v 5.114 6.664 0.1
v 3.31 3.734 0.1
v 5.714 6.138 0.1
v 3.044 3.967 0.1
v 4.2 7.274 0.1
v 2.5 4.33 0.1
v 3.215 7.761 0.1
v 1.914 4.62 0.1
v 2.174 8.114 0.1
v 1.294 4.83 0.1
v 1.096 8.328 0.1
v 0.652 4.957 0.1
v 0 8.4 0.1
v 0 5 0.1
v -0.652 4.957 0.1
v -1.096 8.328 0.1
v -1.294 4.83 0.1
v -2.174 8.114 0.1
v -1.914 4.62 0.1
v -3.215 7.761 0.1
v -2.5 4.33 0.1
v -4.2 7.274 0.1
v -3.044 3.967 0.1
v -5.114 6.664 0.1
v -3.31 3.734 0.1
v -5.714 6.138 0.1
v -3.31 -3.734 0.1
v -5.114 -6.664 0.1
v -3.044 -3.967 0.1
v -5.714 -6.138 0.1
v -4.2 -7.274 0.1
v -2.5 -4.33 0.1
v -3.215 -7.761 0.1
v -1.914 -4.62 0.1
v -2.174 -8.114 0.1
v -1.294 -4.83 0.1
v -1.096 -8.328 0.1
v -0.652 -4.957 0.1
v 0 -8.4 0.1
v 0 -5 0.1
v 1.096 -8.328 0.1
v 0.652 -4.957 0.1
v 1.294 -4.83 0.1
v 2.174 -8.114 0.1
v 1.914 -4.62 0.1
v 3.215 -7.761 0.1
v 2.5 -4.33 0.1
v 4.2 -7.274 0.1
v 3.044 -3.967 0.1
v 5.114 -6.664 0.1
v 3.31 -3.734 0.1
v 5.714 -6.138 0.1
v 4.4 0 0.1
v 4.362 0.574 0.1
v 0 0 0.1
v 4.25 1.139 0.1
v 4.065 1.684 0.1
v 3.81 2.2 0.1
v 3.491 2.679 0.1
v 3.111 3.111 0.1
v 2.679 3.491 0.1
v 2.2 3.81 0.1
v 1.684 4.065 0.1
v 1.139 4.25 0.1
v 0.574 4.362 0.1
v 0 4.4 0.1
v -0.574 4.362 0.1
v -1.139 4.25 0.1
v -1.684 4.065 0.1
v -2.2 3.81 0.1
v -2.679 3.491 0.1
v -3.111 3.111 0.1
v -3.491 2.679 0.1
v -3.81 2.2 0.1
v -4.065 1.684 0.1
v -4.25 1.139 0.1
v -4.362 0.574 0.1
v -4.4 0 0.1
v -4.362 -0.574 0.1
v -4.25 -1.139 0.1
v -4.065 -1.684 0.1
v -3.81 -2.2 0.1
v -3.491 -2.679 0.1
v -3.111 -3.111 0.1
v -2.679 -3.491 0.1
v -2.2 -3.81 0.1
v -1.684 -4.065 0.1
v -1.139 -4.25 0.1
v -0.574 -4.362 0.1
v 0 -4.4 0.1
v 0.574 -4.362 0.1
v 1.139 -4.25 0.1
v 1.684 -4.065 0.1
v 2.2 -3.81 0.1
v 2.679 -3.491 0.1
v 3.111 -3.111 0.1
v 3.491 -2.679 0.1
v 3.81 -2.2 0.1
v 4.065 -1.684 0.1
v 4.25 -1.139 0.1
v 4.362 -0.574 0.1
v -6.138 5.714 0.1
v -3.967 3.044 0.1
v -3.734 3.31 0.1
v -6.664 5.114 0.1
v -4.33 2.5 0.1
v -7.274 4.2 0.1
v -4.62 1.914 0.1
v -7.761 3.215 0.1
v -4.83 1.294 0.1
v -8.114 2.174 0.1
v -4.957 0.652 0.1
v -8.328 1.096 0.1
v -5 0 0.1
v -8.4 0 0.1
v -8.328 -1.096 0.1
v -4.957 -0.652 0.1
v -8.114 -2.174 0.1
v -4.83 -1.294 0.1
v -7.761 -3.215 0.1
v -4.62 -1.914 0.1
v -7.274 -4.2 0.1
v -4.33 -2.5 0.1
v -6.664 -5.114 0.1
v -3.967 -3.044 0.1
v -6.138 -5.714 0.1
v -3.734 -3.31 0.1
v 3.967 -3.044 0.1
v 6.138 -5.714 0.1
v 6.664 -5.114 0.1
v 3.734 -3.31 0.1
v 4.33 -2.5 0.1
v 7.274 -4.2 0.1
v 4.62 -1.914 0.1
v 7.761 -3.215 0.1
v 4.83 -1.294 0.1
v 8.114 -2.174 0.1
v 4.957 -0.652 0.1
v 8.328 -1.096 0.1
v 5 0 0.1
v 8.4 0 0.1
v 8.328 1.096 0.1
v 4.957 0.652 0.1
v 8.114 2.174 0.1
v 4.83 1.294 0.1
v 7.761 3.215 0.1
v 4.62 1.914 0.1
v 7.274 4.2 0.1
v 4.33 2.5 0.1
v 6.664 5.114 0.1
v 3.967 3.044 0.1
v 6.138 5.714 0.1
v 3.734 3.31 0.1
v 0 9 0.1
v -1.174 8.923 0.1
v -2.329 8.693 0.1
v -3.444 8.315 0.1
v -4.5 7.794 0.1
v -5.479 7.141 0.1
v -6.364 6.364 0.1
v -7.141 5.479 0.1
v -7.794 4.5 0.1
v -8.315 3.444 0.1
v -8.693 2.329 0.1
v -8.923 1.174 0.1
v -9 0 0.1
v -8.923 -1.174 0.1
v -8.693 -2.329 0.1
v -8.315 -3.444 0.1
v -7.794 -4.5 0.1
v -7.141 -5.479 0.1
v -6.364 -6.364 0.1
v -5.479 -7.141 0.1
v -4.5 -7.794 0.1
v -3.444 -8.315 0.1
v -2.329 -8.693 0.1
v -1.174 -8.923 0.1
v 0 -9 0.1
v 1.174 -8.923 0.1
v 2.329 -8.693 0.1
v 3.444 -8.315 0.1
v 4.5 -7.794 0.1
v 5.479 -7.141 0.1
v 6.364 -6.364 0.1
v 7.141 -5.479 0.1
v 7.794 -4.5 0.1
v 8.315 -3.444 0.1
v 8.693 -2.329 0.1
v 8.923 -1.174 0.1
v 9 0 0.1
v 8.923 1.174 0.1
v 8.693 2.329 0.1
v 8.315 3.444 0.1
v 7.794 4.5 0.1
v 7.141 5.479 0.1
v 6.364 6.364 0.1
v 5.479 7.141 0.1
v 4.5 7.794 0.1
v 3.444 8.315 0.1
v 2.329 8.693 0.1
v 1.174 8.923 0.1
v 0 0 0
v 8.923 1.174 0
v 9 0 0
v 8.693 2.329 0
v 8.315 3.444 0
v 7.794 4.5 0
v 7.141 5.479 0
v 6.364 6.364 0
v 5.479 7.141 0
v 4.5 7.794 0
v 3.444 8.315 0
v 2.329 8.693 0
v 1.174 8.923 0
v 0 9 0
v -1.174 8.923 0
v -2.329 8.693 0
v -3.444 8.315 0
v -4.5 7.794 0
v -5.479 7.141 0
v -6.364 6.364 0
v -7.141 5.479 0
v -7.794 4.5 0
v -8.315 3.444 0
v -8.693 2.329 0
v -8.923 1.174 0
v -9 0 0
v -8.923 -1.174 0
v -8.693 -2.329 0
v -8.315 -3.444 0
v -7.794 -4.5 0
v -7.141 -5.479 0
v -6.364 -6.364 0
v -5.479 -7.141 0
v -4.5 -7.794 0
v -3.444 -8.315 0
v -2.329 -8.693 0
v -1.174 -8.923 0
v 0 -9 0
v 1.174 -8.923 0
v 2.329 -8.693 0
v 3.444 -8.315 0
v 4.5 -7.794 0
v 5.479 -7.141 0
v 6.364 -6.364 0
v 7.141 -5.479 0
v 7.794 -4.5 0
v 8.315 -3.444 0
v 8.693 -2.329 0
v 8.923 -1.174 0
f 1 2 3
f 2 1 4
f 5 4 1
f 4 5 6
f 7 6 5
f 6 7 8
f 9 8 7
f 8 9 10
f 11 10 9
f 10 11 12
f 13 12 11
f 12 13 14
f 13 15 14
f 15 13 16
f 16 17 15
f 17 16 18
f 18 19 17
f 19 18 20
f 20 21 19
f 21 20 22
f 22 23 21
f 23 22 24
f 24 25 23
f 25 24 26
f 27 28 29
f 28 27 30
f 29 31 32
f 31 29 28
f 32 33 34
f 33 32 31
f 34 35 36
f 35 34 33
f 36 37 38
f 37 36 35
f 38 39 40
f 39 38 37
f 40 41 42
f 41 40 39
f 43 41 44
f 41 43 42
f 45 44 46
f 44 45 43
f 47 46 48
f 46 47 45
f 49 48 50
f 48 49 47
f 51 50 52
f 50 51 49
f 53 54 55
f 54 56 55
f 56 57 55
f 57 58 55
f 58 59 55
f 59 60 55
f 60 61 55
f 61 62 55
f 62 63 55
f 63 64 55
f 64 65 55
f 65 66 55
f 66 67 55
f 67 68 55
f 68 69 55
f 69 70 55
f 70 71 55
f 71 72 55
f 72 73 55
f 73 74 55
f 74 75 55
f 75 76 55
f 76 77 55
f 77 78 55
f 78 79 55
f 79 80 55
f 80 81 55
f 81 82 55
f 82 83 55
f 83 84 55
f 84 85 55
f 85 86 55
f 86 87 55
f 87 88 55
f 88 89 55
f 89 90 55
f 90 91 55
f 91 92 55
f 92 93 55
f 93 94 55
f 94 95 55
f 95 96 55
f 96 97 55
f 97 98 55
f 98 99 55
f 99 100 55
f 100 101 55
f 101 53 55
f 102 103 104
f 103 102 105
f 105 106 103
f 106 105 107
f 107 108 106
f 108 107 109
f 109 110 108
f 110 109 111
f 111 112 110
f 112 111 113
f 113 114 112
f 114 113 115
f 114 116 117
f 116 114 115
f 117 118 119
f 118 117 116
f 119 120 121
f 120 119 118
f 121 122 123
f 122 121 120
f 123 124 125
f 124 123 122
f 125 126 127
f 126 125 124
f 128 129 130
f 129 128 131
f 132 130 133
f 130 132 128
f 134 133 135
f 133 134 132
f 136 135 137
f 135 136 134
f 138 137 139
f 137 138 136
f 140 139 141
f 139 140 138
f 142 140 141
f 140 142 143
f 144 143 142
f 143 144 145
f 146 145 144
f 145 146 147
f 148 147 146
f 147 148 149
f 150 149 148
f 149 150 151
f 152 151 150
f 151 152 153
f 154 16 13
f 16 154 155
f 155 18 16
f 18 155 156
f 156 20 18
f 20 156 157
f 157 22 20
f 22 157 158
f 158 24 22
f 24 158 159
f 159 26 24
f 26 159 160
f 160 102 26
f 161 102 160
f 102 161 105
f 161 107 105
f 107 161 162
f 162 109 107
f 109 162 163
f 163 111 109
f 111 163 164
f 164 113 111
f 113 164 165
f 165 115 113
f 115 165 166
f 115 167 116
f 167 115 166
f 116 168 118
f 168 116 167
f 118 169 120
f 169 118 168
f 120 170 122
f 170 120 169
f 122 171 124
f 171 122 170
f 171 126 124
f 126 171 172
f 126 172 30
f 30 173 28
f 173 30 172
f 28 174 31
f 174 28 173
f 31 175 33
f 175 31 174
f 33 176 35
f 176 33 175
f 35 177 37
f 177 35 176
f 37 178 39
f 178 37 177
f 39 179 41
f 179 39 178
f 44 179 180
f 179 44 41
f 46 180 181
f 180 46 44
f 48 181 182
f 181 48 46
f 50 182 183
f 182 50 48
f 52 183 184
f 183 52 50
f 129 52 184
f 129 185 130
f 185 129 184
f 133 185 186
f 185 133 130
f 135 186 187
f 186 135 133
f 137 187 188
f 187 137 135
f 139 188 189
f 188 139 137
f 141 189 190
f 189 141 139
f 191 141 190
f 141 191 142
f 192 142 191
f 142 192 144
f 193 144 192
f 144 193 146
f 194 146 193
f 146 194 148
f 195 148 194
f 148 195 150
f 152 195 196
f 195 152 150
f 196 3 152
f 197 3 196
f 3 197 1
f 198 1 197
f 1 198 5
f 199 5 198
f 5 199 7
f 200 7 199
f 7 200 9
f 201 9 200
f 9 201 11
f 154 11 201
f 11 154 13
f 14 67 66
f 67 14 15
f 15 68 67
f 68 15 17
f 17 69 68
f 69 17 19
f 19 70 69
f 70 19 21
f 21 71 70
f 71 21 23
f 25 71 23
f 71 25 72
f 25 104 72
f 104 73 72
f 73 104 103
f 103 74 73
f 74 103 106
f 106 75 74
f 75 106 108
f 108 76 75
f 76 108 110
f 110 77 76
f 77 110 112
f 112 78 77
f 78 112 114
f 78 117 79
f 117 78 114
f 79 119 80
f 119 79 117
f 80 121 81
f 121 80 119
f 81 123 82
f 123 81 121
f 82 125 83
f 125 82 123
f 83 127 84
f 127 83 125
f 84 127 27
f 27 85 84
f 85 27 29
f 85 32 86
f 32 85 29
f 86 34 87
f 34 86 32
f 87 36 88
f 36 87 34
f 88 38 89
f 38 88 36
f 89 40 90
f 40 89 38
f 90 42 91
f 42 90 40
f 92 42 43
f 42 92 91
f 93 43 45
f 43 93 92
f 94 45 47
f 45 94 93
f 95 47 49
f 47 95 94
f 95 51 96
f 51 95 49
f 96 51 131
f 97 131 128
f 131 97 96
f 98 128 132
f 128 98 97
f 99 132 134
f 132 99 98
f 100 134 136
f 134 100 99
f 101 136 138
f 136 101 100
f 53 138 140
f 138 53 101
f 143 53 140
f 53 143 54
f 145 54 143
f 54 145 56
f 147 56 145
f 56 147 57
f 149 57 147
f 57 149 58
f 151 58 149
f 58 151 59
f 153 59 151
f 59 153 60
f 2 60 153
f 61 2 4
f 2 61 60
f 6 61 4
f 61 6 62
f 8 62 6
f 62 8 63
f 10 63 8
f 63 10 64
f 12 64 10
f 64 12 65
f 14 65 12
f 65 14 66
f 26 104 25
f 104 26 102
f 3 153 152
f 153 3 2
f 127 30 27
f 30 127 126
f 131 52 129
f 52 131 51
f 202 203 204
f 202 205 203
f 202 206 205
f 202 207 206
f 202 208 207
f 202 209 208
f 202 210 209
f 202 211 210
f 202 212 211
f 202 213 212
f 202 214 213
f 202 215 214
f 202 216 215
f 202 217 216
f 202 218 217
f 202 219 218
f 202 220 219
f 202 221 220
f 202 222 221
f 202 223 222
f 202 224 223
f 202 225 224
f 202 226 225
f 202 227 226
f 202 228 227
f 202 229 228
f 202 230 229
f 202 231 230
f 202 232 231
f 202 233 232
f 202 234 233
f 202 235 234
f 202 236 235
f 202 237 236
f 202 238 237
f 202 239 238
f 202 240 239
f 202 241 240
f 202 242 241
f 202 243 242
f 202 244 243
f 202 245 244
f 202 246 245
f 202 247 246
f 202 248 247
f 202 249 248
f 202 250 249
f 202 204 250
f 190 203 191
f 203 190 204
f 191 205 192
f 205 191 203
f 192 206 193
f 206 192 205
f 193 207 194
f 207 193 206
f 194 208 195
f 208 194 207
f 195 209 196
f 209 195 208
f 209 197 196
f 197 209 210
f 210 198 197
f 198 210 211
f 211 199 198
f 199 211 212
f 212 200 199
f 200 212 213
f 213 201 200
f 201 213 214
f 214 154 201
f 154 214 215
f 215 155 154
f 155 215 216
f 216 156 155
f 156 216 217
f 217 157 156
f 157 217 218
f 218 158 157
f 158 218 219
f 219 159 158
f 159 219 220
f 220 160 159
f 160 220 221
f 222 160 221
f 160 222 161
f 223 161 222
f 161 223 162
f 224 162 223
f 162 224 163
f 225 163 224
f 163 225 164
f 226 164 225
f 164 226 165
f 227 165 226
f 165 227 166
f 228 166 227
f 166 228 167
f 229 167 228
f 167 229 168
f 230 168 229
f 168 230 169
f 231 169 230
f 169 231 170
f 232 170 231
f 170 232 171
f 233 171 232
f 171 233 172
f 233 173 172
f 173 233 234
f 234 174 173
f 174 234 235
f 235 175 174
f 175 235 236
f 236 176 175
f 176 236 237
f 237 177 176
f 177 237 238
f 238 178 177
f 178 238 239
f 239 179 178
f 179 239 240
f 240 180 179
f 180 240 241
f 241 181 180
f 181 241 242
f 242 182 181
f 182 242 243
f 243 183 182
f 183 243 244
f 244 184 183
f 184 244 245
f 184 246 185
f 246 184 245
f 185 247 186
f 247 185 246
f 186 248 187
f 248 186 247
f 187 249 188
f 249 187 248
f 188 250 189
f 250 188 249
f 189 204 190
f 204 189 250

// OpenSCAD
// file: ../p/48/1-4cyli.scad
use <../../lib.scad>
function ldraw_lib__48__1_4cyli() = [
// 0 Hi-Res Cylinder 0.25
// 0 Name: 48\1-4cyli.dat
// 0 Author: Manfred Moolhuysen
// 0 !LDRAW_ORG 48_Primitive UPDATE 2009-01
// 0 !LICENSE Licensed under CC BY 2.0 and CC BY 4.0 : see CAreadme.txt
// 
// 0 BFC CERTIFY CCW
  [0,"BFC","CERTIFY"],
  [0,"BFC","CCW"],
// 
// 0 !HISTORY 1999-07-05 [PTadmin] Official Update 1999-05
// 0 !HISTORY 2002-02-28 [hafhead] Added BFC statement
// 0 !HISTORY 2002-04-25 [PTadmin] Official Update 2002-02
// 0 !HISTORY 2007-06-24 [PTadmin] Header formatted for Contributor Agreement
// 0 !HISTORY 2008-07-01 [PTadmin] Official Update 2008-01
// 0 !HISTORY 2008-07-07 [guyvivan] Made BFC'ed CCW (2005-12-06)
// 0 !HISTORY 2009-05-02 [PTadmin] Official Update 2009-01
// 
// 
// 4 16 0.9914 0 0.1305 1 0 0 1 1 0 0.9914 1 0.1305
  [4,16,0.9914,0,0.1305,1,0,0,1,1,0,0.9914,1,0.1305],
// 4 16 0.9659 0 0.2588 0.9914 0 0.1305 0.9914 1 0.1305 0.9659 1 0.2588
  [4,16,0.9659,0,0.2588,0.9914,0,0.1305,0.9914,1,0.1305,0.9659,1,0.2588],
// 4 16 0.9239 0 0.3827 0.9659 0 0.2588 0.9659 1 0.2588 0.9239 1 0.3827
  [4,16,0.9239,0,0.3827,0.9659,0,0.2588,0.9659,1,0.2588,0.9239,1,0.3827],
// 4 16 0.866 0 0.5 0.9239 0 0.3827 0.9239 1 0.3827 0.866 1 0.5
  [4,16,0.866,0,0.5,0.9239,0,0.3827,0.9239,1,0.3827,0.866,1,0.5],
// 4 16 0.7934 0 0.6088 0.866 0 0.5 0.866 1 0.5 0.7934 1 0.6088
  [4,16,0.7934,0,0.6088,0.866,0,0.5,0.866,1,0.5,0.7934,1,0.6088],
// 4 16 0.7071 0 0.7071 0.7934 0 0.6088 0.7934 1 0.6088 0.7071 1 0.7071
  [4,16,0.7071,0,0.7071,0.7934,0,0.6088,0.7934,1,0.6088,0.7071,1,0.7071],
// 4 16 0.6088 0 0.7934 0.7071 0 0.7071 0.7071 1 0.7071 0.6088 1 0.7934
  [4,16,0.6088,0,0.7934,0.7071,0,0.7071,0.7071,1,0.7071,0.6088,1,0.7934],
// 4 16 0.5 0 0.866 0.6088 0 0.7934 0.6088 1 0.7934 0.5 1 0.866
  [4,16,0.5,0,0.866,0.6088,0,0.7934,0.6088,1,0.7934,0.5,1,0.866],
// 4 16 0.3827 0 0.9239 0.5 0 0.866 0.5 1 0.866 0.3827 1 0.9239
  [4,16,0.3827,0,0.9239,0.5,0,0.866,0.5,1,0.866,0.3827,1,0.9239],
// 4 16 0.2588 0 0.9659 0.3827 0 0.9239 0.3827 1 0.9239 0.2588 1 0.9659
  [4,16,0.2588,0,0.9659,0.3827,0,0.9239,0.3827,1,0.9239,0.2588,1,0.9659],
// 4 16 0.1305 0 0.9914 0.2588 0 0.9659 0.2588 1 0.9659 0.1305 1 0.9914
  [4,16,0.1305,0,0.9914,0.2588,0,0.9659,0.2588,1,0.9659,0.1305,1,0.9914],
// 4 16 0 0 1 0.1305 0 0.9914 0.1305 1 0.9914 0 1 1
  [4,16,0,0,1,0.1305,0,0.9914,0.1305,1,0.9914,0,1,1],
// 
// 0 conditional lines
// 5 24 1 1 0 1 0 0 1 1 -1 0.9914 1 0.1305
  [5,24,1,1,0,1,0,0,1,1,-1,0.9914,1,0.1305],
// 5 24 0.9914 1 0.1305 0.9914 0 0.1305 1 1 0 0.9659 1 0.2588
  [5,24,0.9914,1,0.1305,0.9914,0,0.1305,1,1,0,0.9659,1,0.2588],
// 5 24 0.9659 1 0.2588 0.9659 0 0.2588 0.9914 1 0.1305 0.9239 1 0.3827
  [5,24,0.9659,1,0.2588,0.9659,0,0.2588,0.9914,1,0.1305,0.9239,1,0.3827],
// 5 24 0.9239 1 0.3827 0.9239 0 0.3827 0.9659 1 0.2588 0.866 1 0.5
  [5,24,0.9239,1,0.3827,0.9239,0,0.3827,0.9659,1,0.2588,0.866,1,0.5],
// 5 24 0.866 1 0.5 0.866 0 0.5 0.9239 1 0.3827 0.7934 1 0.6088
  [5,24,0.866,1,0.5,0.866,0,0.5,0.9239,1,0.3827,0.7934,1,0.6088],
// 5 24 0.7934 1 0.6088 0.7934 0 0.6088 0.866 1 0.5 0.7071 1 0.7071
  [5,24,0.7934,1,0.6088,0.7934,0,0.6088,0.866,1,0.5,0.7071,1,0.7071],
// 5 24 0.7071 1 0.7071 0.7071 0 0.7071 0.7934 1 0.6088 0.6088 1 0.7934
  [5,24,0.7071,1,0.7071,0.7071,0,0.7071,0.7934,1,0.6088,0.6088,1,0.7934],
// 5 24 0.6088 1 0.7934 0.6088 0 0.7934 0.7071 1 0.7071 0.5 1 0.866
  [5,24,0.6088,1,0.7934,0.6088,0,0.7934,0.7071,1,0.7071,0.5,1,0.866],
// 5 24 0.5 1 0.866 0.5 0 0.866 0.6088 1 0.7934 0.3827 1 0.9239
  [5,24,0.5,1,0.866,0.5,0,0.866,0.6088,1,0.7934,0.3827,1,0.9239],
// 5 24 0.3827 1 0.9239 0.3827 0 0.9239 0.5 1 0.866 0.2588 1 0.9659
  [5,24,0.3827,1,0.9239,0.3827,0,0.9239,0.5,1,0.866,0.2588,1,0.9659],
// 5 24 0.2588 1 0.9659 0.2588 0 0.9659 0.3827 1 0.9239 0.1305 1 0.9914
  [5,24,0.2588,1,0.9659,0.2588,0,0.9659,0.3827,1,0.9239,0.1305,1,0.9914],
// 5 24 0.1305 1 0.9914 0.1305 0 0.9914 0.2588 1 0.9659 0 1 1
  [5,24,0.1305,1,0.9914,0.1305,0,0.9914,0.2588,1,0.9659,0,1,1],
// 5 24 0 1 1 0 0 1 0.1305 1 0.9914 -1 1 1
  [5,24,0,1,1,0,0,1,0.1305,1,0.9914,-1,1,1],
// 
// 0 end of file
];
module ldraw_lib__48__1_4cyli(step=0, col=false, unit=2/5, alt=false, line=0.2, solid=!$preview)
    makepoly(ldraw_lib__48__1_4cyli(), step=step, col=col, unit=unit, alt=alt, line=line, solid=solid);
ldraw_lib__48__1_4cyli(line=0.2);
// file: ../p/48/4-4disc.scad
use <../../lib.scad>
function ldraw_lib__48__4_4disc() = [
// 0 Hi-Res Disc 1.0
// 0 Name: 48\4-4disc.dat
// 0 Author: Miklos Hosszu [hmick]
// 0 !LDRAW_ORG 48_Primitive UPDATE 2012-02
// 0 !LICENSE Licensed under CC BY 2.0 and CC BY 4.0 : see CAreadme.txt
// 
// 0 BFC CERTIFY CCW
  [0,"BFC","CERTIFY"],
  [0,"BFC","CCW"],
// 
// 0 !HISTORY 2004-11-06 [PTadmin] Official Update 2004-04
// 0 !HISTORY 2007-06-24 [PTadmin] Header formatted for Contributor Agreement
// 0 !HISTORY 2008-07-01 [PTadmin] Official Update 2008-01
// 0 !HISTORY 2012-02-27 [Philo] Changed to CCW
// 0 !HISTORY 2012-08-09 [PTadmin] Official Update 2012-02
// 
// 
// 3 16 1 0 0 0.9914 0 0.1305 0 0 0
  [3,16,1,0,0,0.9914,0,0.1305,0,0,0],
// 3 16 0.9914 0 0.1305 0.9659 0 0.2588 0 0 0
  [3,16,0.9914,0,0.1305,0.9659,0,0.2588,0,0,0],
// 3 16 0.9659 0 0.2588 0.9239 0 0.3827 0 0 0
  [3,16,0.9659,0,0.2588,0.9239,0,0.3827,0,0,0],
// 3 16 0.9239 0 0.3827 0.866 0 0.5 0 0 0
  [3,16,0.9239,0,0.3827,0.866,0,0.5,0,0,0],
// 3 16 0.866 0 0.5 0.7934 0 0.6088 0 0 0
  [3,16,0.866,0,0.5,0.7934,0,0.6088,0,0,0],
// 3 16 0.7934 0 0.6088 0.7071 0 0.7071 0 0 0
  [3,16,0.7934,0,0.6088,0.7071,0,0.7071,0,0,0],
// 3 16 0.7071 0 0.7071 0.6088 0 0.7934 0 0 0
  [3,16,0.7071,0,0.7071,0.6088,0,0.7934,0,0,0],
// 3 16 0.6088 0 0.7934 0.5 0 0.866 0 0 0
  [3,16,0.6088,0,0.7934,0.5,0,0.866,0,0,0],
// 3 16 0.5 0 0.866 0.3827 0 0.9239 0 0 0
  [3,16,0.5,0,0.866,0.3827,0,0.9239,0,0,0],
// 3 16 0.3827 0 0.9239 0.2588 0 0.9659 0 0 0
  [3,16,0.3827,0,0.9239,0.2588,0,0.9659,0,0,0],
// 3 16 0.2588 0 0.9659 0.1305 0 0.9914 0 0 0
  [3,16,0.2588,0,0.9659,0.1305,0,0.9914,0,0,0],
// 3 16 0.1305 0 0.9914 0 0 1 0 0 0
  [3,16,0.1305,0,0.9914,0,0,1,0,0,0],
// 3 16 0 0 1 -0.1305 0 0.9914 0 0 0
  [3,16,0,0,1,-0.1305,0,0.9914,0,0,0],
// 3 16 -0.1305 0 0.9914 -0.2588 0 0.9659 0 0 0
  [3,16,-0.1305,0,0.9914,-0.2588,0,0.9659,0,0,0],
// 3 16 -0.2588 0 0.9659 -0.3827 0 0.9239 0 0 0
  [3,16,-0.2588,0,0.9659,-0.3827,0,0.9239,0,0,0],
// 3 16 -0.3827 0 0.9239 -0.5 0 0.866 0 0 0
  [3,16,-0.3827,0,0.9239,-0.5,0,0.866,0,0,0],
// 3 16 -0.5 0 0.866 -0.6088 0 0.7934 0 0 0
  [3,16,-0.5,0,0.866,-0.6088,0,0.7934,0,0,0],
// 3 16 -0.6088 0 0.7934 -0.7071 0 0.7071 0 0 0
  [3,16,-0.6088,0,0.7934,-0.7071,0,0.7071,0,0,0],
// 3 16 -0.7071 0 0.7071 -0.7934 0 0.6088 0 0 0
  [3,16,-0.7071,0,0.7071,-0.7934,0,0.6088,0,0,0],
// 3 16 -0.7934 0 0.6088 -0.866 0 0.5 0 0 0
  [3,16,-0.7934,0,0.6088,-0.866,0,0.5,0,0,0],
// 3 16 -0.866 0 0.5 -0.9239 0 0.3827 0 0 0
  [3,16,-0.866,0,0.5,-0.9239,0,0.3827,0,0,0],
// 3 16 -0.9239 0 0.3827 -0.9659 0 0.2588 0 0 0
  [3,16,-0.9239,0,0.3827,-0.9659,0,0.2588,0,0,0],
// 3 16 -0.9659 0 0.2588 -0.9914 0 0.1305 0 0 0
  [3,16,-0.9659,0,0.2588,-0.9914,0,0.1305,0,0,0],
// 3 16 -0.9914 0 0.1305 -1 0 0 0 0 0
  [3,16,-0.9914,0,0.1305,-1,0,0,0,0,0],
// 3 16 -1 0 0 -0.9914 0 -0.1305 0 0 0
  [3,16,-1,0,0,-0.9914,0,-0.1305,0,0,0],
// 3 16 -0.9914 0 -0.1305 -0.9659 0 -0.2588 0 0 0
  [3,16,-0.9914,0,-0.1305,-0.9659,0,-0.2588,0,0,0],
// 3 16 -0.9659 0 -0.2588 -0.9239 0 -0.3827 0 0 0
  [3,16,-0.9659,0,-0.2588,-0.9239,0,-0.3827,0,0,0],
// 3 16 -0.9239 0 -0.3827 -0.866 0 -0.5 0 0 0
  [3,16,-0.9239,0,-0.3827,-0.866,0,-0.5,0,0,0],
// 3 16 -0.866 0 -0.5 -0.7934 0 -0.6088 0 0 0
  [3,16,-0.866,0,-0.5,-0.7934,0,-0.6088,0,0,0],
// 3 16 -0.7934 0 -0.6088 -0.7071 0 -0.7071 0 0 0
  [3,16,-0.7934,0,-0.6088,-0.7071,0,-0.7071,0,0,0],
// 3 16 -0.7071 0 -0.7071 -0.6088 0 -0.7934 0 0 0
  [3,16,-0.7071,0,-0.7071,-0.6088,0,-0.7934,0,0,0],
// 3 16 -0.6088 0 -0.7934 -0.5 0 -0.866 0 0 0
  [3,16,-0.6088,0,-0.7934,-0.5,0,-0.866,0,0,0],
// 3 16 -0.5 0 -0.866 -0.3827 0 -0.9239 0 0 0
  [3,16,-0.5,0,-0.866,-0.3827,0,-0.9239,0,0,0],
// 3 16 -0.3827 0 -0.9239 -0.2588 0 -0.9659 0 0 0
  [3,16,-0.3827,0,-0.9239,-0.2588,0,-0.9659,0,0,0],
// 3 16 -0.2588 0 -0.9659 -0.1305 0 -0.9914 0 0 0
  [3,16,-0.2588,0,-0.9659,-0.1305,0,-0.9914,0,0,0],
// 3 16 -0.1305 0 -0.9914 0 0 -1 0 0 0
  [3,16,-0.1305,0,-0.9914,0,0,-1,0,0,0],
// 3 16 0 0 -1 0.1305 0 -0.9914 0 0 0
  [3,16,0,0,-1,0.1305,0,-0.9914,0,0,0],
// 3 16 0.1305 0 -0.9914 0.2588 0 -0.9659 0 0 0
  [3,16,0.1305,0,-0.9914,0.2588,0,-0.9659,0,0,0],
// 3 16 0.2588 0 -0.9659 0.3827 0 -0.9239 0 0 0
  [3,16,0.2588,0,-0.9659,0.3827,0,-0.9239,0,0,0],
// 3 16 0.3827 0 -0.9239 0.5 0 -0.866 0 0 0
  [3,16,0.3827,0,-0.9239,0.5,0,-0.866,0,0,0],
// 3 16 0.5 0 -0.866 0.6088 0 -0.7934 0 0 0
  [3,16,0.5,0,-0.866,0.6088,0,-0.7934,0,0,0],
// 3 16 0.6088 0 -0.7934 0.7071 0 -0.7071 0 0 0
  [3,16,0.6088,0,-0.7934,0.7071,0,-0.7071,0,0,0],
// 3 16 0.7071 0 -0.7071 0.7934 0 -0.6088 0 0 0
  [3,16,0.7071,0,-0.7071,0.7934,0,-0.6088,0,0,0],
// 3 16 0.7934 0 -0.6088 0.866 0 -0.5 0 0 0
  [3,16,0.7934,0,-0.6088,0.866,0,-0.5,0,0,0],
// 3 16 0.866 0 -0.5 0.9239 0 -0.3827 0 0 0
  [3,16,0.866,0,-0.5,0.9239,0,-0.3827,0,0,0],
// 3 16 0.9239 0 -0.3827 0.9659 0 -0.2588 0 0 0
  [3,16,0.9239,0,-0.3827,0.9659,0,-0.2588,0,0,0],
// 3 16 0.9659 0 -0.2588 0.9914 0 -0.1305 0 0 0
  [3,16,0.9659,0,-0.2588,0.9914,0,-0.1305,0,0,0],
// 3 16 0.9914 0 -0.1305 1 0 0 0 0 0
  [3,16,0.9914,0,-0.1305,1,0,0,0,0,0],
];
module ldraw_lib__48__4_4disc(step=0, col=false, unit=2/5, alt=false, line=0.2, solid=!$preview)
    makepoly(ldraw_lib__48__4_4disc(), step=step, col=col, unit=unit, alt=alt, line=line, solid=solid);
ldraw_lib__48__4_4disc(line=0.2);
// file: ../p/48/4-4cyli.scad
use <../../lib.scad>
use <1-4cyli.scad>
function ldraw_lib__48__4_4cyli() = [
// 0 Hi-Res Cylinder 1.0
// 0 Name: 48\4-4cyli.dat
// 0 Author: Paul Easter [pneaster]
// 0 !LDRAW_ORG 48_Primitive UPDATE 2012-02
// 0 !LICENSE Licensed under CC BY 4.0 : see CAreadme.txt
// 
// 0 BFC CERTIFY CCW
  [0,"BFC","CERTIFY"],
  [0,"BFC","CCW"],
// 
// 0 !HISTORY 2002-08-18 [PTadmin] Official Update 2002-04
// 0 !HISTORY 2007-06-24 [PTadmin] Header formatted for Contributor Agreement
// 0 !HISTORY 2008-07-01 [PTadmin] Official Update 2008-01
// 0 !HISTORY 2012-02-27 [Philo] Changed to CCW
// 0 !HISTORY 2012-08-09 [PTadmin] Official Update 2012-02
// 
// 
// 1 16 0 0 0 1 0 0 0 1 0 0 0 1 48\1-4cyli.dat
  [1,16,0,0,0,1,0,0,0,1,0,0,0,1, ldraw_lib__48__1_4cyli()],
// 1 16 0 0 0 0 0 -1 0 1 0 1 0 0 48\1-4cyli.dat
  [1,16,0,0,0,0,0,-1,0,1,0,1,0,0, ldraw_lib__48__1_4cyli()],
// 1 16 0 0 0 -1 0 0 0 1 0 0 0 -1 48\1-4cyli.dat
  [1,16,0,0,0,-1,0,0,0,1,0,0,0,-1, ldraw_lib__48__1_4cyli()],
// 1 16 0 0 0 0 0 1 0 1 0 -1 0 0 48\1-4cyli.dat
  [1,16,0,0,0,0,0,1,0,1,0,-1,0,0, ldraw_lib__48__1_4cyli()],
];
module ldraw_lib__48__4_4cyli(step=0, col=false, unit=2/5, alt=false, line=0.2, solid=!$preview)
    makepoly(ldraw_lib__48__4_4cyli(), step=step, col=col, unit=unit, alt=alt, line=line, solid=solid);
ldraw_lib__48__4_4cyli(line=0.2);
// file: 004488e.scad
use <../lib.scad>
use <../p/48/4-4cyli.scad>
use <../p/48/4-4disc.scad>
use <s/004488es01.scad>
function ldraw_lib__004488e() = [
// 0 Sticker  2.3 x  2.3 Round with Lifepreserver
// 0 Name: 004488e.dat
// 0 Author: Willy Tschager [Holly-Wood]
// 0 !LDRAW_ORG Part UPDATE 2022-01
// 0 !LICENSE Licensed under CC BY 4.0 : see CAreadme.txt
// 
// 0 BFC CERTIFY CCW
  [0,"BFC","CERTIFY"],
  [0,"BFC","CCW"],
// 
// 0 !KEYWORDS buoy, coastguard, dock, harbor, harbour, life ring, lifeguard
// 0 !KEYWORDS police, port, rescue, salvage, set 364, set 369, wharf
// 
// 0 !HISTORY 2020-06-28 [PTadmin] Official Update 2020-01
// 0 !HISTORY 2020-08-25 [Holly-Wood] separated pattern into subfile
// 0 !HISTORY 2022-01-14 [PTadmin] Official Update 2022-01
// 
// 
// 0 // Pattern
// 1 16 0 0 0 1 0 0 0 1 0 0 0 1 s\004488es01.dat
  [1,16,0,0,0,1,0,0,0,1,0,0,0,1, ldraw_lib__s__004488es01()],
// 
// 0 // Small cylinder
// 1 16 0 0 0 22.5 0 0 0 -1 0 0 0 22.5 48\4-4disc.dat
  [1,16,0,0,0,22.5,0,0,0,-1,0,0,0,22.5, ldraw_lib__48__4_4disc()],
// 1 16 0 -.25 0 22.5 0 0 0 .25 0 0 0 22.5 48\4-4cyli.dat
  [1,16,0,-.25,0,22.5,0,0,0,.25,0,0,0,22.5, ldraw_lib__48__4_4cyli()],
];
module ldraw_lib__004488e(step=0, col=false, unit=2/5, alt=false, line=0.2, solid=!$preview)
    makepoly(ldraw_lib__004488e(), step=step, col=col, unit=unit, alt=alt, line=line, solid=solid);
ldraw_lib__004488e(line=0.2);
// main file
use <../lib.scad>
use <004488e.scad>
function ldraw_lib__004632b() = [
// 0 =Sticker  2.3 x  2.3 Round with Lifepreserver
// 0 Name: 004632b.dat
// 0 Author: Willy Tschager [Holly-Wood]
// 0 !LDRAW_ORG Part Alias UPDATE 2022-01
// 0 !LICENSE Licensed under CC BY 4.0 : see CAreadme.txt
// 
// 0 BFC CERTIFY CCW
  [0,"BFC","CERTIFY"],
  [0,"BFC","CCW"],
// 
// 0 !KEYWORDS buoy, coastguard, dock, harbor, harbour, life ring, lifeguard
// 0 !KEYWORDS police, port, rescue, salvage, set 364, set 369, wharf
// 
// 0 !HISTORY 2022-01-14 [PTadmin] Official Update 2022-01
// 
// 
// 1 16 0 0 0 1 0 0 0 1 0 0 0 1 004488e.dat
  [1,16,0,0,0,1,0,0,0,1,0,0,0,1, ldraw_lib__004488e()],
];
module ldraw_lib__004632b(step=0, col=false, unit=2/5, alt=false, line=0.2, solid=!$preview)
    makepoly(ldraw_lib__004632b(), step=step, col=col, unit=unit, alt=alt, line=line, solid=solid);
ldraw_lib__004632b(line=0.2);
